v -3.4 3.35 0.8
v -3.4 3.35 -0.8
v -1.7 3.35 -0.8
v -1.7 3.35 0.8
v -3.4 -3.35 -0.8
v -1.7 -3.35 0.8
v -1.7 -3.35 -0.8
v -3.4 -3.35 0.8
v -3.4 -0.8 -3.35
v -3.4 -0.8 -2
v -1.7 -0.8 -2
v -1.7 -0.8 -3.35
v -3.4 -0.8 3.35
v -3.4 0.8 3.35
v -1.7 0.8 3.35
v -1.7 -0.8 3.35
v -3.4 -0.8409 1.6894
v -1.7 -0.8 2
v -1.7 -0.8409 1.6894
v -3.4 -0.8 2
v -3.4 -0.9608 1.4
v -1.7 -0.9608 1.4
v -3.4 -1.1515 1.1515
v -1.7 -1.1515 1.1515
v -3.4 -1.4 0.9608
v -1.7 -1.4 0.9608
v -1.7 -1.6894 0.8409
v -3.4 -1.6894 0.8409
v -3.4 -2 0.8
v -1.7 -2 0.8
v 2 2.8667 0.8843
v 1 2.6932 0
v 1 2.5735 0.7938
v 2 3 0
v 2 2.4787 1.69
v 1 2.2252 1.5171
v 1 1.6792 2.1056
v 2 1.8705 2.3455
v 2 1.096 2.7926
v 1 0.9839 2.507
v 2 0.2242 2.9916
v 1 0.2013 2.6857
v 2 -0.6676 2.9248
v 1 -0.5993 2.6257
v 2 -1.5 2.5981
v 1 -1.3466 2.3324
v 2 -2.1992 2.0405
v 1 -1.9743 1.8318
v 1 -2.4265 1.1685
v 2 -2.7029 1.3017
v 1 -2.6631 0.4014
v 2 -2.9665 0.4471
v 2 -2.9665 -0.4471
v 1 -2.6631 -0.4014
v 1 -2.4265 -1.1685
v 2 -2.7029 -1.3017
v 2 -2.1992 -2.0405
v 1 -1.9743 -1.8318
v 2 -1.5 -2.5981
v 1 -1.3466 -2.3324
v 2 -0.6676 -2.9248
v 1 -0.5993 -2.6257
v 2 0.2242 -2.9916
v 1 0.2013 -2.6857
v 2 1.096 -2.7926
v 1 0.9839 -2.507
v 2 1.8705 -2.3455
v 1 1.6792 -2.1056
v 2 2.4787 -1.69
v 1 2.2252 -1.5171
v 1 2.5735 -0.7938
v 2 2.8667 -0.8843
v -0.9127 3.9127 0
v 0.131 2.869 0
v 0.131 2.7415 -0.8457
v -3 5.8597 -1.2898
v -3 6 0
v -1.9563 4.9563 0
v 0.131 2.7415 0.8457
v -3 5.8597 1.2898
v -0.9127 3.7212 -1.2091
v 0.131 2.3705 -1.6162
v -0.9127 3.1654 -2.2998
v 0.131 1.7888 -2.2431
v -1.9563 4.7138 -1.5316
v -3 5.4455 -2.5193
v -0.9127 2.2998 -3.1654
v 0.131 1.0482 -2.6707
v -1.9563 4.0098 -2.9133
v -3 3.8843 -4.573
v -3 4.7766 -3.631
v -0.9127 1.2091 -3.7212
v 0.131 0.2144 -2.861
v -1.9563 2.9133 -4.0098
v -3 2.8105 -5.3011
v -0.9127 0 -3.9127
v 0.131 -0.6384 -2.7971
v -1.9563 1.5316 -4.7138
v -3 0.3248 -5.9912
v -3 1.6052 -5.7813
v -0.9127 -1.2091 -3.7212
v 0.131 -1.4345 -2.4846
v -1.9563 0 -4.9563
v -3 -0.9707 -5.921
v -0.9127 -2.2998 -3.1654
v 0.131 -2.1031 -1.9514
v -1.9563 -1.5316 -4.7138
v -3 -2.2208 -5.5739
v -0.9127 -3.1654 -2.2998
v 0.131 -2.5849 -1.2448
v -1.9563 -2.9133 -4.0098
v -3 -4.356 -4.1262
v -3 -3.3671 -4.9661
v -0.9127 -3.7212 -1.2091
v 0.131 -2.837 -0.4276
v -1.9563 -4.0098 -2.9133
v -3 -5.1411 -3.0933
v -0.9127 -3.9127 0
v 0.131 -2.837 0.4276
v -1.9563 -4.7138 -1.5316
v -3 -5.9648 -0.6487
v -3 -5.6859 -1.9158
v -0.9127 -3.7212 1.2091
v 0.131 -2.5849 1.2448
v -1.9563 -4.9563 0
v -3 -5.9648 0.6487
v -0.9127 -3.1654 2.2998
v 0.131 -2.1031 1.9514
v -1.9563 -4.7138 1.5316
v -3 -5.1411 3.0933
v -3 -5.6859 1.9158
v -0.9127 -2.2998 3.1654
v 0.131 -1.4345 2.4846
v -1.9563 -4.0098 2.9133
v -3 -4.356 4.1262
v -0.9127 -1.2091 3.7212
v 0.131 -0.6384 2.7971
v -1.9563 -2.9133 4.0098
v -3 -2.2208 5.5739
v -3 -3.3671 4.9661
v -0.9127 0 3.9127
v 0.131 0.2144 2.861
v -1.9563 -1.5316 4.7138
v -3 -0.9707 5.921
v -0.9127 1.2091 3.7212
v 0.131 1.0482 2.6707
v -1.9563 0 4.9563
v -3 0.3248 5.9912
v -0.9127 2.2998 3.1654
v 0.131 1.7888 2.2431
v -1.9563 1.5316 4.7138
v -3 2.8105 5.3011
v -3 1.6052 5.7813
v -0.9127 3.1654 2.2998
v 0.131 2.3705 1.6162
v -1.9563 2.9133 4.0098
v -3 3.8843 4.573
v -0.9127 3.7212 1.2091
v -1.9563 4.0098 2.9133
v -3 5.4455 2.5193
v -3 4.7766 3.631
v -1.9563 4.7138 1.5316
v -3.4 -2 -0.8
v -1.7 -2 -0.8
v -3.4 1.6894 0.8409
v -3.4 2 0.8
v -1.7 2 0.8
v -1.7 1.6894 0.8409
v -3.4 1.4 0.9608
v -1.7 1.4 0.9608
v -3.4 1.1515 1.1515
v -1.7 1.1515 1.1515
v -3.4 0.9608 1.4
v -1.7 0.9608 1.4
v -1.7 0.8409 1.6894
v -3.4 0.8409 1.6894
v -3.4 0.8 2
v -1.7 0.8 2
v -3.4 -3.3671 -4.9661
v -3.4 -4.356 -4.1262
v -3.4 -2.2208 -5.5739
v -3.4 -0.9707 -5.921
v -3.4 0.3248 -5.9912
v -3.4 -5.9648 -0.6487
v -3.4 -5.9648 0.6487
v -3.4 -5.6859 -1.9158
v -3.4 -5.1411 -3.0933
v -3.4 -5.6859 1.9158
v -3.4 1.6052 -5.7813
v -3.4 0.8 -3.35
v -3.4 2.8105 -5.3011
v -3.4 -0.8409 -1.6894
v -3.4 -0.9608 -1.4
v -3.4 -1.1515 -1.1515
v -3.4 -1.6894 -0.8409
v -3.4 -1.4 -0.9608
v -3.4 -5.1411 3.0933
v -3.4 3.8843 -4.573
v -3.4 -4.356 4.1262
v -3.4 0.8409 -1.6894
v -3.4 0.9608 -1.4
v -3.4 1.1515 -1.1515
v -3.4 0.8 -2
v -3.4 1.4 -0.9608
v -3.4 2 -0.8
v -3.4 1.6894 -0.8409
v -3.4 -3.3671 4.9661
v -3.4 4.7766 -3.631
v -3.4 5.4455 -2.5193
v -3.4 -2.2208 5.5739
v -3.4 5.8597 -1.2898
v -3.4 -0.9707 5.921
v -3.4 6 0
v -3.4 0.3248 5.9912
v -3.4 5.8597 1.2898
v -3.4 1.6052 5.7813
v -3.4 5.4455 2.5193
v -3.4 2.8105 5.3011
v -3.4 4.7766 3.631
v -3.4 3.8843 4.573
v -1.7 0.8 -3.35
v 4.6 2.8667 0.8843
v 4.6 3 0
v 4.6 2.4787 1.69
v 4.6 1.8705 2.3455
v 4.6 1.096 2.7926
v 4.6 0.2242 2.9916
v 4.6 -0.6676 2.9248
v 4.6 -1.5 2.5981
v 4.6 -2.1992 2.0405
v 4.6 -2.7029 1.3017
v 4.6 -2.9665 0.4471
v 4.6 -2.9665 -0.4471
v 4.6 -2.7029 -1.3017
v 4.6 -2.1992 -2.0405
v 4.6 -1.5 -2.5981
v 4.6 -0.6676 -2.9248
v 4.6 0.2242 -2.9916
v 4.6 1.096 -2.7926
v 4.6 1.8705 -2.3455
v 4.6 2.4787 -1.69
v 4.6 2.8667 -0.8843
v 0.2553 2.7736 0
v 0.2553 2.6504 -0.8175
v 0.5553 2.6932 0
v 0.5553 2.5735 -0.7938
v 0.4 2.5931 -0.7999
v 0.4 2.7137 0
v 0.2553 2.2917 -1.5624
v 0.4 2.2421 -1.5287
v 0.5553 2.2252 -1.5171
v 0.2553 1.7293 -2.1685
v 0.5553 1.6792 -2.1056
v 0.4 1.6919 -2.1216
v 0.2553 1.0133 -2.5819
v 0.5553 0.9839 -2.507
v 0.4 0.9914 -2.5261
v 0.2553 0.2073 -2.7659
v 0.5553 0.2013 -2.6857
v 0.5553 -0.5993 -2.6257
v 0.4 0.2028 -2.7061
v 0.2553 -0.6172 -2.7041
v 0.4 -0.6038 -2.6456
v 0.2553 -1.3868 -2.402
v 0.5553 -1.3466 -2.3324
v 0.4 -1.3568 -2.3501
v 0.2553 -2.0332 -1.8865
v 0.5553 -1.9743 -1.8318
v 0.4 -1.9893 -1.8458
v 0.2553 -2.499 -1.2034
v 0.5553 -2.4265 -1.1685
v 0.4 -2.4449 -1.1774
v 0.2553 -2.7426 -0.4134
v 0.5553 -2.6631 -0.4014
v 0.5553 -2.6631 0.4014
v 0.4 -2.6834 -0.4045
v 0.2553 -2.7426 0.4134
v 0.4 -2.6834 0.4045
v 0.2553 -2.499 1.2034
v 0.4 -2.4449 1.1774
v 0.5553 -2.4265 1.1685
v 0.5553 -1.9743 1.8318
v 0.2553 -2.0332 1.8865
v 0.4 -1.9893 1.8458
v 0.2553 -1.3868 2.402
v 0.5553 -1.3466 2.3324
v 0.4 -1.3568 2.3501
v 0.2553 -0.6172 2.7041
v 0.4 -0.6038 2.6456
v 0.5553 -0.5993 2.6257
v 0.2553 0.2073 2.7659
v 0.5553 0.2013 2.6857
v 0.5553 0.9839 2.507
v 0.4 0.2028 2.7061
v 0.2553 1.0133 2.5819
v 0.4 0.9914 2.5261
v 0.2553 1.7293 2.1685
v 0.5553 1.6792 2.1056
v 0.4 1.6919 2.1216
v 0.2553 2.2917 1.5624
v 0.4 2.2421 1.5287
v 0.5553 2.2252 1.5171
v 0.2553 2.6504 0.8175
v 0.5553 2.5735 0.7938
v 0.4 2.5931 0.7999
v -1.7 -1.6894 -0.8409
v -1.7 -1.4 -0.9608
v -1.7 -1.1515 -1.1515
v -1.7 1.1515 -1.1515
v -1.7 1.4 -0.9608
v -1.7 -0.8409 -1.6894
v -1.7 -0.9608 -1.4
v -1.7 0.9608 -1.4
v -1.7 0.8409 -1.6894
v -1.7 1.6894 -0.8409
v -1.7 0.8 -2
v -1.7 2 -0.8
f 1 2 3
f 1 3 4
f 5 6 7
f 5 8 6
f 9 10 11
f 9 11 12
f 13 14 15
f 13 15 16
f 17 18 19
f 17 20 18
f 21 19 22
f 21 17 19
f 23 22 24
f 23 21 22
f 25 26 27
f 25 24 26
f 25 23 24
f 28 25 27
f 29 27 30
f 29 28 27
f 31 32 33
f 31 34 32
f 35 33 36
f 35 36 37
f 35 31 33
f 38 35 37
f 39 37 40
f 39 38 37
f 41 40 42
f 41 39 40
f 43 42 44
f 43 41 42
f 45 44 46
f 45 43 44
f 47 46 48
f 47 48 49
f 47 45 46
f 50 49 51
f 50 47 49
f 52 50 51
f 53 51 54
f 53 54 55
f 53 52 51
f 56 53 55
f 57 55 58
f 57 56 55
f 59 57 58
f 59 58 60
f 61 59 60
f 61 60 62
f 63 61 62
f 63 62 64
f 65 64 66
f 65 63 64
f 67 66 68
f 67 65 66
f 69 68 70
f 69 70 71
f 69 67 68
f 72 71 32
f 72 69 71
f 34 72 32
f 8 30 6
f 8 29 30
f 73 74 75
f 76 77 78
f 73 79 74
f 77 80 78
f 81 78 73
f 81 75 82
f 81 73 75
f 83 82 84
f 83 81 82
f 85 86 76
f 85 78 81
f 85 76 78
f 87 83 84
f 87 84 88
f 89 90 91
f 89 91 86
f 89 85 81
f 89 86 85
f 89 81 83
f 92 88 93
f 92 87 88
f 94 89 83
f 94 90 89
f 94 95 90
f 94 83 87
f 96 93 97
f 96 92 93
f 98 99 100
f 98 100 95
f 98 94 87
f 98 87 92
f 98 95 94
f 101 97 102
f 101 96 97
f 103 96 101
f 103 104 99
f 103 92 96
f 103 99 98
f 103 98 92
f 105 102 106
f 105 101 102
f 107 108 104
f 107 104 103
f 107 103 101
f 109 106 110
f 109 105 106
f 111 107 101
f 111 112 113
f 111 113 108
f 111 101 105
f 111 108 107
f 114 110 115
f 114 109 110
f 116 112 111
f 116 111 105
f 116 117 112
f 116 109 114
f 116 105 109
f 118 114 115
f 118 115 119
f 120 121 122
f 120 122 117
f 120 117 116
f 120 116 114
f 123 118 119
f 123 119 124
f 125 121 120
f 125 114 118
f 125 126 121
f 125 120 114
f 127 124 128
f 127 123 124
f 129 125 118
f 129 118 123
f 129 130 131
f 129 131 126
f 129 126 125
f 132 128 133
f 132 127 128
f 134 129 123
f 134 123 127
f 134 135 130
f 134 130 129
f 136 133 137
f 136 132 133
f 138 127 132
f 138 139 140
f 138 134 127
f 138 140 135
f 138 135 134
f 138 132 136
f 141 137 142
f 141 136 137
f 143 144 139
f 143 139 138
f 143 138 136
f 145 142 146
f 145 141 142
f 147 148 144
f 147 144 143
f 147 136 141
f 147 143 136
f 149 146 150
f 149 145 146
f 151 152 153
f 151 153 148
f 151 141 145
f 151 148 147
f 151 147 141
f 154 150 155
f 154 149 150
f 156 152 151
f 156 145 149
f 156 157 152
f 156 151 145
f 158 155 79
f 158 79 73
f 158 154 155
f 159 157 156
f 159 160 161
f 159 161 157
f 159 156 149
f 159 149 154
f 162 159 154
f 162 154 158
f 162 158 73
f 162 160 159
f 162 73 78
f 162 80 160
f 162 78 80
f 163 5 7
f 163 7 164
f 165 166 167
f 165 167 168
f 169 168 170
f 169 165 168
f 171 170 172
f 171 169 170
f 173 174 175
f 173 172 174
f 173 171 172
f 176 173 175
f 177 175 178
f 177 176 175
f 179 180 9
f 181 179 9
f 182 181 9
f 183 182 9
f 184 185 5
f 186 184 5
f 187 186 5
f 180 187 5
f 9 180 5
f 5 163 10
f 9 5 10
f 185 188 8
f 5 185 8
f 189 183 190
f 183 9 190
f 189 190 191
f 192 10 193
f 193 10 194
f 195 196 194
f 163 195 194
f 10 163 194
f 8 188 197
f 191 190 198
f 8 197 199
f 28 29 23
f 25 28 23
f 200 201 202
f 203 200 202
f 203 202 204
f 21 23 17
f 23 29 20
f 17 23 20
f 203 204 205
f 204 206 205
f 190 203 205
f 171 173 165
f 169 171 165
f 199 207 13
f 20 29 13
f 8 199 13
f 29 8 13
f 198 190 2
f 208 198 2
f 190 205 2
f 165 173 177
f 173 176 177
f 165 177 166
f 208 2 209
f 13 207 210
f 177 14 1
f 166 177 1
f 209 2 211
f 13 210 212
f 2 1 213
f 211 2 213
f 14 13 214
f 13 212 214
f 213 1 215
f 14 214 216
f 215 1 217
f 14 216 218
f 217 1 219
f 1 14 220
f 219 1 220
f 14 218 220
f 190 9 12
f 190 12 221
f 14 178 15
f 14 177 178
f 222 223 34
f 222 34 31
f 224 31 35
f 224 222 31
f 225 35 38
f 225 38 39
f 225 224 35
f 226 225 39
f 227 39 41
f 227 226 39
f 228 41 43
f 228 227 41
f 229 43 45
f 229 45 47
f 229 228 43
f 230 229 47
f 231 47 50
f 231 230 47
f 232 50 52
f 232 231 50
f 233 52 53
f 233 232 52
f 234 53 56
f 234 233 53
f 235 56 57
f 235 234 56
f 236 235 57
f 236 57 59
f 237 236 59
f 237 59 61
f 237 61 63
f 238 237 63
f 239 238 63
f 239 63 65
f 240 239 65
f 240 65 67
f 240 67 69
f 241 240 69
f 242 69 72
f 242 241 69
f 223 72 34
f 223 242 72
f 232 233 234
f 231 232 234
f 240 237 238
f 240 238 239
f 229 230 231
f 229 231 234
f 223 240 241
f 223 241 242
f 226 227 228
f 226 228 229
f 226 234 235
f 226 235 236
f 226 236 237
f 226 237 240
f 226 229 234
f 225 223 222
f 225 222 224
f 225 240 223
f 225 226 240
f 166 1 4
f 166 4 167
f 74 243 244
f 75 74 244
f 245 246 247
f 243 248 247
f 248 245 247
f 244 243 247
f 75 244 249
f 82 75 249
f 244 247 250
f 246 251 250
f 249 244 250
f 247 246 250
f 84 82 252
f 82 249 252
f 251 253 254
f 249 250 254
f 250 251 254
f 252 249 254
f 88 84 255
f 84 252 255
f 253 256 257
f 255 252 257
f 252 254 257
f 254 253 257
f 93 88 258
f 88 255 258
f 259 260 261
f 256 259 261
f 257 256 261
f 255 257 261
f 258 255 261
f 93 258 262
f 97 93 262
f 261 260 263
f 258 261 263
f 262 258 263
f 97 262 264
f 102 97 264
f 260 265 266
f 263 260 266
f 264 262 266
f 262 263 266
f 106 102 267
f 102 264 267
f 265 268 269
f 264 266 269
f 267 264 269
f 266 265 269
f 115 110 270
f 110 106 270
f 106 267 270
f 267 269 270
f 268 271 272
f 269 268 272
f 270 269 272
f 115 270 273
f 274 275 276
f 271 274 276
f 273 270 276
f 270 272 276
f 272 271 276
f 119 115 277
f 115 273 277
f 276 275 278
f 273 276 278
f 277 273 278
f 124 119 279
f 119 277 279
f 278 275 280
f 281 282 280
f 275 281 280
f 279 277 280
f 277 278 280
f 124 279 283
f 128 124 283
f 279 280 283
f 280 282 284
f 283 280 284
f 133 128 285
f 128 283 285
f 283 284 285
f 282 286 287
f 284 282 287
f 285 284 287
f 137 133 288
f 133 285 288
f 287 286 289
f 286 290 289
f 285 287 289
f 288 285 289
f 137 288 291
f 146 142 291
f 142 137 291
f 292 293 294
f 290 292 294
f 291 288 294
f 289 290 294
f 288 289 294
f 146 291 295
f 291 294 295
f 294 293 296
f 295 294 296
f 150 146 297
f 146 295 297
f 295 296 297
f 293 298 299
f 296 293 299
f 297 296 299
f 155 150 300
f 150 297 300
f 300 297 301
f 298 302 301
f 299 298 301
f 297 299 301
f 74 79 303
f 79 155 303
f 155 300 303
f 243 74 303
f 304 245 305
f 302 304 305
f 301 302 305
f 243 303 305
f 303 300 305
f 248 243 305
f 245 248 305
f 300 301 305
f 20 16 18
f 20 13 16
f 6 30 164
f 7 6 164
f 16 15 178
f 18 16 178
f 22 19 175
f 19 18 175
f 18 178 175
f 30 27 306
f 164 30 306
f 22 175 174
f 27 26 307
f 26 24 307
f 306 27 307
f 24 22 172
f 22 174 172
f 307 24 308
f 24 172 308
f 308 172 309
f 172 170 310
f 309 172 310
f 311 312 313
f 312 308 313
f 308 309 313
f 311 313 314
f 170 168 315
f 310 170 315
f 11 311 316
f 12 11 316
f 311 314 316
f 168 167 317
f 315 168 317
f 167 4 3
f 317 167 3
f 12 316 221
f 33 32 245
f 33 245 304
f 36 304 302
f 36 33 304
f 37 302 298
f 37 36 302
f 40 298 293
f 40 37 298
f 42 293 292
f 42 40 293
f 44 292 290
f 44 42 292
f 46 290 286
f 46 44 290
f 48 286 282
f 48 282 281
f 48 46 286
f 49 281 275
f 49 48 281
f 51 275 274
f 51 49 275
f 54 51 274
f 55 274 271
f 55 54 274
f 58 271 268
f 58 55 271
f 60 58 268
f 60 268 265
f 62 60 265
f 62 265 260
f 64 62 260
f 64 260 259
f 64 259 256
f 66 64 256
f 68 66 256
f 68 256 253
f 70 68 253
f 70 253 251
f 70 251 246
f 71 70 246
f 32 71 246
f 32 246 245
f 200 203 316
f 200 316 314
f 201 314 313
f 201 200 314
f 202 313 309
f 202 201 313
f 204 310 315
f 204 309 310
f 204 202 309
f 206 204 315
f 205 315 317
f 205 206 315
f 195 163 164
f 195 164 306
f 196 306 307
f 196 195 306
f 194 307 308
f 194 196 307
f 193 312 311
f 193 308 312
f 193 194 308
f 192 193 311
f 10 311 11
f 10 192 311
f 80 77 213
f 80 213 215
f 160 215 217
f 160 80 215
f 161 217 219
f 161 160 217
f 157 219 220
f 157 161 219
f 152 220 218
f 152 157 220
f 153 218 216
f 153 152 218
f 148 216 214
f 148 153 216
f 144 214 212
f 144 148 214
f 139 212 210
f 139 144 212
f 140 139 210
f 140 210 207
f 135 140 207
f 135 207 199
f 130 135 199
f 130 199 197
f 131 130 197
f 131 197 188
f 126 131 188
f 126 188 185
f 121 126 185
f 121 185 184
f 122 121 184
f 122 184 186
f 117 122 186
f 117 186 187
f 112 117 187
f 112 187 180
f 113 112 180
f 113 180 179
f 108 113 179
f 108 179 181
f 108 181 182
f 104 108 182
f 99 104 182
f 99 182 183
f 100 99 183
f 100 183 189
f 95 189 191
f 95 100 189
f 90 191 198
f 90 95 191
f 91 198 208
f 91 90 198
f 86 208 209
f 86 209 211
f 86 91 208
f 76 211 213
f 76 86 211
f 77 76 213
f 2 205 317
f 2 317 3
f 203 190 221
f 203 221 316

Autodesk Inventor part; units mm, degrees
sketch "Sketch_1" plane through (0, 0, 0) normal (0, 0, 1) x (1, 0, 0)
  line L0 (4.6, 0) -> (-3.4, 0)
  line L1 (-3.4, 0) -> (-3.4, 6)
  line L2 (-3.4, 6) -> (-3, 6)
  line L3 (-3, 6) -> (0.131, 2.869)
  arc A0 (0.131, 2.869) -> (0.5553, 2.6932) centre (0.5553, 3.2932) ccw
  line L4 (0.5553, 2.6932) -> (1, 2.6932)
  line L5 (1, 2.6932) -> (2, 3)
  line L6 (2, 3) -> (4.6, 3)
  line L7 (4.6, 3) -> (4.6, 0)
  line L8 (4.6, 0) -> (-3.4, 0)
revolve "Revolution1" add sketch "Sketch_1" angle 360 about axis through (4.6, 0, 0) along (1, 0, 0)
thread "Thread1" size "M6x1" class "6g" standard "ISO Metric profile" full length
sketch "Sketch_2" plane through (-3.4, 0, 0) normal (1, 0, 0) x (0, 0, -1)
  line L0 (-3.35, -0.8) -> (-2, -0.8)
  arc A0 (-0.8, -2) -> (-2, -0.8) centre (-2, -2) ccw
  line L1 (-0.8, -2) -> (-0.8, -3.35)
  line L2 (-0.8, -3.35) -> (0.8, -3.35)
  line L3 (0.8, -3.35) -> (0.8, -2)
  arc A1 (2, -0.8) -> (0.8, -2) centre (2, -2) ccw
  line L4 (2, -0.8) -> (3.35, -0.8)
  line L5 (3.35, -0.8) -> (3.35, 0.8)
  line L6 (3.35, 0.8) -> (2, 0.8)
  arc A2 (0.8, 2) -> (2, 0.8) centre (2, 2) ccw
  line L7 (0.8, 2) -> (0.8, 3.35)
  line L8 (0.8, 3.35) -> (-0.8, 3.35)
  line L9 (-0.8, 3.35) -> (-0.8, 2)
  arc A3 (-2, 0.8) -> (-0.8, 2) centre (-2, 2) ccw
  line L10 (-2, 0.8) -> (-3.35, 0.8)
  line L11 (-3.35, 0.8) -> (-3.35, -0.8)
extrude "Extrusion1" cut sketch "Sketch_2" along normal blind 1.7
ref_plane "bolt_XY" through (-3.4, 0, 0) normal (1, 0, 0) x (0, 0, -1)
ref_plane "bolt_YZ" through (-3.4, 0, 0) normal (0, 0, -1) x (0, 1, 0)
ref_plane "bolt_ZX" through (-3.4, 0, 0) normal (0, 1, 0) x (1, 0, 0)
ref_plane "nut_XY" through (4.6, 0, 0) normal (1, 0, 0) x (0, 0, -1)
ref_plane "nut_YZ" through (4.6, 0, 0) normal (0, 0, -1) x (0, 1, 0)
ref_plane "nut_ZX" through (4.6, 0, 0) normal (0, 1, 0) x (1, 0, 0)
properties part number "SFBJ6-8"
